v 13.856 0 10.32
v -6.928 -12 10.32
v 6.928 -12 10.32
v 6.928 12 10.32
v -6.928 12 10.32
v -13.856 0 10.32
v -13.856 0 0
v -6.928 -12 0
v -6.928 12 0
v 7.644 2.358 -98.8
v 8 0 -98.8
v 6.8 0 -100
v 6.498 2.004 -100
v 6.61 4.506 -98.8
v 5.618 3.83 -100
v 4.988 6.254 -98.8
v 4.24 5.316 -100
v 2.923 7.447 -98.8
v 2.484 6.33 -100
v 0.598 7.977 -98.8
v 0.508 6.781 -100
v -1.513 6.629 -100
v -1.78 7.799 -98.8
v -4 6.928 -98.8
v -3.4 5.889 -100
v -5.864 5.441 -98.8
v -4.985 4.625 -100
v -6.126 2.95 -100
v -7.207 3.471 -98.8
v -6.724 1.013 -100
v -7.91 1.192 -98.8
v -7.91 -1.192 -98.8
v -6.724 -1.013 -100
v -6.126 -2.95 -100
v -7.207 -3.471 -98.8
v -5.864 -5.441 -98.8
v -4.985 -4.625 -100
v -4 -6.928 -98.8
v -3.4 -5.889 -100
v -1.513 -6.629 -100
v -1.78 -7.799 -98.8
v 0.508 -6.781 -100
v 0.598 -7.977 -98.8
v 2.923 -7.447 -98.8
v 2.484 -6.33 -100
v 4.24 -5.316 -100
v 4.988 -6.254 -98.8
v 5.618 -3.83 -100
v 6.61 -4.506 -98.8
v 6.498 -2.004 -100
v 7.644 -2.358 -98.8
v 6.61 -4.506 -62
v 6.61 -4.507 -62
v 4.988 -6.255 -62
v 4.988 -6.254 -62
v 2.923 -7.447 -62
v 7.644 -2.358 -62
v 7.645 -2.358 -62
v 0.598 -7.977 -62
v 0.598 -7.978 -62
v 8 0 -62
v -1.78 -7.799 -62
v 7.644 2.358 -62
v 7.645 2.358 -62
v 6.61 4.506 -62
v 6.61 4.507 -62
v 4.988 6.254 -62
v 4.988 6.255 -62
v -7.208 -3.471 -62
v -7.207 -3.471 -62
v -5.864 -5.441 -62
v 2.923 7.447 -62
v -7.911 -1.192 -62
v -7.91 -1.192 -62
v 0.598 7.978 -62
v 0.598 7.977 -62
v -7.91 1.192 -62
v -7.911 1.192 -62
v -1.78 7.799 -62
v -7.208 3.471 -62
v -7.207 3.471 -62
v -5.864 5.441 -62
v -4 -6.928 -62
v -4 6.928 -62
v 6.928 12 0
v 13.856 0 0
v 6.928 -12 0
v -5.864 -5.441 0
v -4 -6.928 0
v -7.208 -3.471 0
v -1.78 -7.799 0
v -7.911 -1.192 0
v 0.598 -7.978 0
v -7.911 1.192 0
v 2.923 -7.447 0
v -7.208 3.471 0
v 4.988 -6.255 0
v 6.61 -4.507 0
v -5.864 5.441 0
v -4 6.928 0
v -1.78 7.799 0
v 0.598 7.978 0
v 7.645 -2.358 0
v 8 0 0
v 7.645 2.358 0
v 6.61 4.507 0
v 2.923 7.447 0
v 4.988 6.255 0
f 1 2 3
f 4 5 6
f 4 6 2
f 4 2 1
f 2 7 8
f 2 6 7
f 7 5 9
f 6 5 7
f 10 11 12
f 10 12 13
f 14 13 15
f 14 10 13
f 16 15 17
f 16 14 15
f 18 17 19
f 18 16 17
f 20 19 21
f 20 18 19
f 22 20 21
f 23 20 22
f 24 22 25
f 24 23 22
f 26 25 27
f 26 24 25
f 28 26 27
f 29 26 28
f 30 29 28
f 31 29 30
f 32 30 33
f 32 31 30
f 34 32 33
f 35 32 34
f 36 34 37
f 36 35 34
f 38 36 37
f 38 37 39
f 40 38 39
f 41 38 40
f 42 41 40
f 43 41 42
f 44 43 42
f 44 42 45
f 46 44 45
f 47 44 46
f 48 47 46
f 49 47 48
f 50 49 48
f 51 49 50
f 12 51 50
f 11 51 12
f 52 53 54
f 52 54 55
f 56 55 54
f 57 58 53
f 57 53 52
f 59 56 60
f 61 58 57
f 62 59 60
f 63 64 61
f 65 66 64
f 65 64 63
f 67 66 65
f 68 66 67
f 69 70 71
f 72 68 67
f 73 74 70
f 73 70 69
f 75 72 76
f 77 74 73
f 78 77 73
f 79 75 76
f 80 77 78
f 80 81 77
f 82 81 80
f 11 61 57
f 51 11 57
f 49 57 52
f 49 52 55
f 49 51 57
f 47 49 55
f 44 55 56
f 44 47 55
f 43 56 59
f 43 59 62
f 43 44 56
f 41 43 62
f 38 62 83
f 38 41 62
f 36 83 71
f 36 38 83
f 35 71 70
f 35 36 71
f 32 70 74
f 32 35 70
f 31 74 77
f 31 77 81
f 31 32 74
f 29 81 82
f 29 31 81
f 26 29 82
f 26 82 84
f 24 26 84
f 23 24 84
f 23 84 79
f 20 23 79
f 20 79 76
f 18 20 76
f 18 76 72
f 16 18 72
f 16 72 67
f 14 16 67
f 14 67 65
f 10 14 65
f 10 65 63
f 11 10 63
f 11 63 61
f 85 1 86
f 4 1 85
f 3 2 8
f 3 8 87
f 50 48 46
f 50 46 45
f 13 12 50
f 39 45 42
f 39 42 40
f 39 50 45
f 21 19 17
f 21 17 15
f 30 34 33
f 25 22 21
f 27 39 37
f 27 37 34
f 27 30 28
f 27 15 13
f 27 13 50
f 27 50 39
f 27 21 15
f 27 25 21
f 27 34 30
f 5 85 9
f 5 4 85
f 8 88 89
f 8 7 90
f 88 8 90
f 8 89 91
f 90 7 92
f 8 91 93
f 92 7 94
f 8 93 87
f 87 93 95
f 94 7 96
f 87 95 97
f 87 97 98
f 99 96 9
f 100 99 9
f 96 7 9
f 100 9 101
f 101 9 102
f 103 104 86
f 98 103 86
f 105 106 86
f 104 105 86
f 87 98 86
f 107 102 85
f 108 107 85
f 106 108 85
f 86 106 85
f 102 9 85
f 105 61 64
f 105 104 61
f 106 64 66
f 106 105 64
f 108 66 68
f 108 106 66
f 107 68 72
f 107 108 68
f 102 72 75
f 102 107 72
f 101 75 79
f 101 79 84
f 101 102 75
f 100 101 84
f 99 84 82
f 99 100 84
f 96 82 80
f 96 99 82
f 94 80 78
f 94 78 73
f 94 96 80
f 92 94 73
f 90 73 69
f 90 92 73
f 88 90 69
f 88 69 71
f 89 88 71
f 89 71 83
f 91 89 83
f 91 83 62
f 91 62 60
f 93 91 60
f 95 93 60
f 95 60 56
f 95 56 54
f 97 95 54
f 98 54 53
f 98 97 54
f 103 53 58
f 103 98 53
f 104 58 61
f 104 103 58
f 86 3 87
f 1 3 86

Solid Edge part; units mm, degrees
sketch "Sketch1" plane through (0, 0, 0) normal (0, 0, 1) x (1, 0, 0)
  circle A0 centre (0, 0) radius 13.92
  dimension "D1" = 27.84
extrude "Protrusion1" add sketch "Sketch1" along normal blind 10.32
sketch "Sketch2" plane through (0, 0, 0) normal (0, 0, -1) x (1, 0, 0)
  circle A0 centre (0, 0) radius 8
extrude "Protrusion2" add sketch "Sketch2" along normal blind 100
sketch "Sketch3" plane through (0, 0, -100) normal (0, 0, -1) x (1, 0, 0)
  circle A0 centre (0, 0) radius 7.9997
extrude "Cutout1" cut sketch "Sketch3" against normal blind 38 flip side to cut
chamfer "Chamfer_1" distance 1.2 angle 45 1 edges at (-7.9997, 0, -100)
sketch "Sketch4" plane through (0, 0, 10.32) normal (0, 0, 1) x (1, 0, 0)
  line L0 (-7.0545, 12) -> (7.0545, 12)
  dimension "D1" = 24
extrude "Cutout2" cut sketch "Sketch4" against normal up to next material side at (0, 12.05, 10.32)
pattern_circular "Pattern1" count 6 over 360 about axis through (0, 0, 10.32) along (0, 0, 1) of "Cutout2"
properties part number "118588" material "Stainless Steel, 304"
